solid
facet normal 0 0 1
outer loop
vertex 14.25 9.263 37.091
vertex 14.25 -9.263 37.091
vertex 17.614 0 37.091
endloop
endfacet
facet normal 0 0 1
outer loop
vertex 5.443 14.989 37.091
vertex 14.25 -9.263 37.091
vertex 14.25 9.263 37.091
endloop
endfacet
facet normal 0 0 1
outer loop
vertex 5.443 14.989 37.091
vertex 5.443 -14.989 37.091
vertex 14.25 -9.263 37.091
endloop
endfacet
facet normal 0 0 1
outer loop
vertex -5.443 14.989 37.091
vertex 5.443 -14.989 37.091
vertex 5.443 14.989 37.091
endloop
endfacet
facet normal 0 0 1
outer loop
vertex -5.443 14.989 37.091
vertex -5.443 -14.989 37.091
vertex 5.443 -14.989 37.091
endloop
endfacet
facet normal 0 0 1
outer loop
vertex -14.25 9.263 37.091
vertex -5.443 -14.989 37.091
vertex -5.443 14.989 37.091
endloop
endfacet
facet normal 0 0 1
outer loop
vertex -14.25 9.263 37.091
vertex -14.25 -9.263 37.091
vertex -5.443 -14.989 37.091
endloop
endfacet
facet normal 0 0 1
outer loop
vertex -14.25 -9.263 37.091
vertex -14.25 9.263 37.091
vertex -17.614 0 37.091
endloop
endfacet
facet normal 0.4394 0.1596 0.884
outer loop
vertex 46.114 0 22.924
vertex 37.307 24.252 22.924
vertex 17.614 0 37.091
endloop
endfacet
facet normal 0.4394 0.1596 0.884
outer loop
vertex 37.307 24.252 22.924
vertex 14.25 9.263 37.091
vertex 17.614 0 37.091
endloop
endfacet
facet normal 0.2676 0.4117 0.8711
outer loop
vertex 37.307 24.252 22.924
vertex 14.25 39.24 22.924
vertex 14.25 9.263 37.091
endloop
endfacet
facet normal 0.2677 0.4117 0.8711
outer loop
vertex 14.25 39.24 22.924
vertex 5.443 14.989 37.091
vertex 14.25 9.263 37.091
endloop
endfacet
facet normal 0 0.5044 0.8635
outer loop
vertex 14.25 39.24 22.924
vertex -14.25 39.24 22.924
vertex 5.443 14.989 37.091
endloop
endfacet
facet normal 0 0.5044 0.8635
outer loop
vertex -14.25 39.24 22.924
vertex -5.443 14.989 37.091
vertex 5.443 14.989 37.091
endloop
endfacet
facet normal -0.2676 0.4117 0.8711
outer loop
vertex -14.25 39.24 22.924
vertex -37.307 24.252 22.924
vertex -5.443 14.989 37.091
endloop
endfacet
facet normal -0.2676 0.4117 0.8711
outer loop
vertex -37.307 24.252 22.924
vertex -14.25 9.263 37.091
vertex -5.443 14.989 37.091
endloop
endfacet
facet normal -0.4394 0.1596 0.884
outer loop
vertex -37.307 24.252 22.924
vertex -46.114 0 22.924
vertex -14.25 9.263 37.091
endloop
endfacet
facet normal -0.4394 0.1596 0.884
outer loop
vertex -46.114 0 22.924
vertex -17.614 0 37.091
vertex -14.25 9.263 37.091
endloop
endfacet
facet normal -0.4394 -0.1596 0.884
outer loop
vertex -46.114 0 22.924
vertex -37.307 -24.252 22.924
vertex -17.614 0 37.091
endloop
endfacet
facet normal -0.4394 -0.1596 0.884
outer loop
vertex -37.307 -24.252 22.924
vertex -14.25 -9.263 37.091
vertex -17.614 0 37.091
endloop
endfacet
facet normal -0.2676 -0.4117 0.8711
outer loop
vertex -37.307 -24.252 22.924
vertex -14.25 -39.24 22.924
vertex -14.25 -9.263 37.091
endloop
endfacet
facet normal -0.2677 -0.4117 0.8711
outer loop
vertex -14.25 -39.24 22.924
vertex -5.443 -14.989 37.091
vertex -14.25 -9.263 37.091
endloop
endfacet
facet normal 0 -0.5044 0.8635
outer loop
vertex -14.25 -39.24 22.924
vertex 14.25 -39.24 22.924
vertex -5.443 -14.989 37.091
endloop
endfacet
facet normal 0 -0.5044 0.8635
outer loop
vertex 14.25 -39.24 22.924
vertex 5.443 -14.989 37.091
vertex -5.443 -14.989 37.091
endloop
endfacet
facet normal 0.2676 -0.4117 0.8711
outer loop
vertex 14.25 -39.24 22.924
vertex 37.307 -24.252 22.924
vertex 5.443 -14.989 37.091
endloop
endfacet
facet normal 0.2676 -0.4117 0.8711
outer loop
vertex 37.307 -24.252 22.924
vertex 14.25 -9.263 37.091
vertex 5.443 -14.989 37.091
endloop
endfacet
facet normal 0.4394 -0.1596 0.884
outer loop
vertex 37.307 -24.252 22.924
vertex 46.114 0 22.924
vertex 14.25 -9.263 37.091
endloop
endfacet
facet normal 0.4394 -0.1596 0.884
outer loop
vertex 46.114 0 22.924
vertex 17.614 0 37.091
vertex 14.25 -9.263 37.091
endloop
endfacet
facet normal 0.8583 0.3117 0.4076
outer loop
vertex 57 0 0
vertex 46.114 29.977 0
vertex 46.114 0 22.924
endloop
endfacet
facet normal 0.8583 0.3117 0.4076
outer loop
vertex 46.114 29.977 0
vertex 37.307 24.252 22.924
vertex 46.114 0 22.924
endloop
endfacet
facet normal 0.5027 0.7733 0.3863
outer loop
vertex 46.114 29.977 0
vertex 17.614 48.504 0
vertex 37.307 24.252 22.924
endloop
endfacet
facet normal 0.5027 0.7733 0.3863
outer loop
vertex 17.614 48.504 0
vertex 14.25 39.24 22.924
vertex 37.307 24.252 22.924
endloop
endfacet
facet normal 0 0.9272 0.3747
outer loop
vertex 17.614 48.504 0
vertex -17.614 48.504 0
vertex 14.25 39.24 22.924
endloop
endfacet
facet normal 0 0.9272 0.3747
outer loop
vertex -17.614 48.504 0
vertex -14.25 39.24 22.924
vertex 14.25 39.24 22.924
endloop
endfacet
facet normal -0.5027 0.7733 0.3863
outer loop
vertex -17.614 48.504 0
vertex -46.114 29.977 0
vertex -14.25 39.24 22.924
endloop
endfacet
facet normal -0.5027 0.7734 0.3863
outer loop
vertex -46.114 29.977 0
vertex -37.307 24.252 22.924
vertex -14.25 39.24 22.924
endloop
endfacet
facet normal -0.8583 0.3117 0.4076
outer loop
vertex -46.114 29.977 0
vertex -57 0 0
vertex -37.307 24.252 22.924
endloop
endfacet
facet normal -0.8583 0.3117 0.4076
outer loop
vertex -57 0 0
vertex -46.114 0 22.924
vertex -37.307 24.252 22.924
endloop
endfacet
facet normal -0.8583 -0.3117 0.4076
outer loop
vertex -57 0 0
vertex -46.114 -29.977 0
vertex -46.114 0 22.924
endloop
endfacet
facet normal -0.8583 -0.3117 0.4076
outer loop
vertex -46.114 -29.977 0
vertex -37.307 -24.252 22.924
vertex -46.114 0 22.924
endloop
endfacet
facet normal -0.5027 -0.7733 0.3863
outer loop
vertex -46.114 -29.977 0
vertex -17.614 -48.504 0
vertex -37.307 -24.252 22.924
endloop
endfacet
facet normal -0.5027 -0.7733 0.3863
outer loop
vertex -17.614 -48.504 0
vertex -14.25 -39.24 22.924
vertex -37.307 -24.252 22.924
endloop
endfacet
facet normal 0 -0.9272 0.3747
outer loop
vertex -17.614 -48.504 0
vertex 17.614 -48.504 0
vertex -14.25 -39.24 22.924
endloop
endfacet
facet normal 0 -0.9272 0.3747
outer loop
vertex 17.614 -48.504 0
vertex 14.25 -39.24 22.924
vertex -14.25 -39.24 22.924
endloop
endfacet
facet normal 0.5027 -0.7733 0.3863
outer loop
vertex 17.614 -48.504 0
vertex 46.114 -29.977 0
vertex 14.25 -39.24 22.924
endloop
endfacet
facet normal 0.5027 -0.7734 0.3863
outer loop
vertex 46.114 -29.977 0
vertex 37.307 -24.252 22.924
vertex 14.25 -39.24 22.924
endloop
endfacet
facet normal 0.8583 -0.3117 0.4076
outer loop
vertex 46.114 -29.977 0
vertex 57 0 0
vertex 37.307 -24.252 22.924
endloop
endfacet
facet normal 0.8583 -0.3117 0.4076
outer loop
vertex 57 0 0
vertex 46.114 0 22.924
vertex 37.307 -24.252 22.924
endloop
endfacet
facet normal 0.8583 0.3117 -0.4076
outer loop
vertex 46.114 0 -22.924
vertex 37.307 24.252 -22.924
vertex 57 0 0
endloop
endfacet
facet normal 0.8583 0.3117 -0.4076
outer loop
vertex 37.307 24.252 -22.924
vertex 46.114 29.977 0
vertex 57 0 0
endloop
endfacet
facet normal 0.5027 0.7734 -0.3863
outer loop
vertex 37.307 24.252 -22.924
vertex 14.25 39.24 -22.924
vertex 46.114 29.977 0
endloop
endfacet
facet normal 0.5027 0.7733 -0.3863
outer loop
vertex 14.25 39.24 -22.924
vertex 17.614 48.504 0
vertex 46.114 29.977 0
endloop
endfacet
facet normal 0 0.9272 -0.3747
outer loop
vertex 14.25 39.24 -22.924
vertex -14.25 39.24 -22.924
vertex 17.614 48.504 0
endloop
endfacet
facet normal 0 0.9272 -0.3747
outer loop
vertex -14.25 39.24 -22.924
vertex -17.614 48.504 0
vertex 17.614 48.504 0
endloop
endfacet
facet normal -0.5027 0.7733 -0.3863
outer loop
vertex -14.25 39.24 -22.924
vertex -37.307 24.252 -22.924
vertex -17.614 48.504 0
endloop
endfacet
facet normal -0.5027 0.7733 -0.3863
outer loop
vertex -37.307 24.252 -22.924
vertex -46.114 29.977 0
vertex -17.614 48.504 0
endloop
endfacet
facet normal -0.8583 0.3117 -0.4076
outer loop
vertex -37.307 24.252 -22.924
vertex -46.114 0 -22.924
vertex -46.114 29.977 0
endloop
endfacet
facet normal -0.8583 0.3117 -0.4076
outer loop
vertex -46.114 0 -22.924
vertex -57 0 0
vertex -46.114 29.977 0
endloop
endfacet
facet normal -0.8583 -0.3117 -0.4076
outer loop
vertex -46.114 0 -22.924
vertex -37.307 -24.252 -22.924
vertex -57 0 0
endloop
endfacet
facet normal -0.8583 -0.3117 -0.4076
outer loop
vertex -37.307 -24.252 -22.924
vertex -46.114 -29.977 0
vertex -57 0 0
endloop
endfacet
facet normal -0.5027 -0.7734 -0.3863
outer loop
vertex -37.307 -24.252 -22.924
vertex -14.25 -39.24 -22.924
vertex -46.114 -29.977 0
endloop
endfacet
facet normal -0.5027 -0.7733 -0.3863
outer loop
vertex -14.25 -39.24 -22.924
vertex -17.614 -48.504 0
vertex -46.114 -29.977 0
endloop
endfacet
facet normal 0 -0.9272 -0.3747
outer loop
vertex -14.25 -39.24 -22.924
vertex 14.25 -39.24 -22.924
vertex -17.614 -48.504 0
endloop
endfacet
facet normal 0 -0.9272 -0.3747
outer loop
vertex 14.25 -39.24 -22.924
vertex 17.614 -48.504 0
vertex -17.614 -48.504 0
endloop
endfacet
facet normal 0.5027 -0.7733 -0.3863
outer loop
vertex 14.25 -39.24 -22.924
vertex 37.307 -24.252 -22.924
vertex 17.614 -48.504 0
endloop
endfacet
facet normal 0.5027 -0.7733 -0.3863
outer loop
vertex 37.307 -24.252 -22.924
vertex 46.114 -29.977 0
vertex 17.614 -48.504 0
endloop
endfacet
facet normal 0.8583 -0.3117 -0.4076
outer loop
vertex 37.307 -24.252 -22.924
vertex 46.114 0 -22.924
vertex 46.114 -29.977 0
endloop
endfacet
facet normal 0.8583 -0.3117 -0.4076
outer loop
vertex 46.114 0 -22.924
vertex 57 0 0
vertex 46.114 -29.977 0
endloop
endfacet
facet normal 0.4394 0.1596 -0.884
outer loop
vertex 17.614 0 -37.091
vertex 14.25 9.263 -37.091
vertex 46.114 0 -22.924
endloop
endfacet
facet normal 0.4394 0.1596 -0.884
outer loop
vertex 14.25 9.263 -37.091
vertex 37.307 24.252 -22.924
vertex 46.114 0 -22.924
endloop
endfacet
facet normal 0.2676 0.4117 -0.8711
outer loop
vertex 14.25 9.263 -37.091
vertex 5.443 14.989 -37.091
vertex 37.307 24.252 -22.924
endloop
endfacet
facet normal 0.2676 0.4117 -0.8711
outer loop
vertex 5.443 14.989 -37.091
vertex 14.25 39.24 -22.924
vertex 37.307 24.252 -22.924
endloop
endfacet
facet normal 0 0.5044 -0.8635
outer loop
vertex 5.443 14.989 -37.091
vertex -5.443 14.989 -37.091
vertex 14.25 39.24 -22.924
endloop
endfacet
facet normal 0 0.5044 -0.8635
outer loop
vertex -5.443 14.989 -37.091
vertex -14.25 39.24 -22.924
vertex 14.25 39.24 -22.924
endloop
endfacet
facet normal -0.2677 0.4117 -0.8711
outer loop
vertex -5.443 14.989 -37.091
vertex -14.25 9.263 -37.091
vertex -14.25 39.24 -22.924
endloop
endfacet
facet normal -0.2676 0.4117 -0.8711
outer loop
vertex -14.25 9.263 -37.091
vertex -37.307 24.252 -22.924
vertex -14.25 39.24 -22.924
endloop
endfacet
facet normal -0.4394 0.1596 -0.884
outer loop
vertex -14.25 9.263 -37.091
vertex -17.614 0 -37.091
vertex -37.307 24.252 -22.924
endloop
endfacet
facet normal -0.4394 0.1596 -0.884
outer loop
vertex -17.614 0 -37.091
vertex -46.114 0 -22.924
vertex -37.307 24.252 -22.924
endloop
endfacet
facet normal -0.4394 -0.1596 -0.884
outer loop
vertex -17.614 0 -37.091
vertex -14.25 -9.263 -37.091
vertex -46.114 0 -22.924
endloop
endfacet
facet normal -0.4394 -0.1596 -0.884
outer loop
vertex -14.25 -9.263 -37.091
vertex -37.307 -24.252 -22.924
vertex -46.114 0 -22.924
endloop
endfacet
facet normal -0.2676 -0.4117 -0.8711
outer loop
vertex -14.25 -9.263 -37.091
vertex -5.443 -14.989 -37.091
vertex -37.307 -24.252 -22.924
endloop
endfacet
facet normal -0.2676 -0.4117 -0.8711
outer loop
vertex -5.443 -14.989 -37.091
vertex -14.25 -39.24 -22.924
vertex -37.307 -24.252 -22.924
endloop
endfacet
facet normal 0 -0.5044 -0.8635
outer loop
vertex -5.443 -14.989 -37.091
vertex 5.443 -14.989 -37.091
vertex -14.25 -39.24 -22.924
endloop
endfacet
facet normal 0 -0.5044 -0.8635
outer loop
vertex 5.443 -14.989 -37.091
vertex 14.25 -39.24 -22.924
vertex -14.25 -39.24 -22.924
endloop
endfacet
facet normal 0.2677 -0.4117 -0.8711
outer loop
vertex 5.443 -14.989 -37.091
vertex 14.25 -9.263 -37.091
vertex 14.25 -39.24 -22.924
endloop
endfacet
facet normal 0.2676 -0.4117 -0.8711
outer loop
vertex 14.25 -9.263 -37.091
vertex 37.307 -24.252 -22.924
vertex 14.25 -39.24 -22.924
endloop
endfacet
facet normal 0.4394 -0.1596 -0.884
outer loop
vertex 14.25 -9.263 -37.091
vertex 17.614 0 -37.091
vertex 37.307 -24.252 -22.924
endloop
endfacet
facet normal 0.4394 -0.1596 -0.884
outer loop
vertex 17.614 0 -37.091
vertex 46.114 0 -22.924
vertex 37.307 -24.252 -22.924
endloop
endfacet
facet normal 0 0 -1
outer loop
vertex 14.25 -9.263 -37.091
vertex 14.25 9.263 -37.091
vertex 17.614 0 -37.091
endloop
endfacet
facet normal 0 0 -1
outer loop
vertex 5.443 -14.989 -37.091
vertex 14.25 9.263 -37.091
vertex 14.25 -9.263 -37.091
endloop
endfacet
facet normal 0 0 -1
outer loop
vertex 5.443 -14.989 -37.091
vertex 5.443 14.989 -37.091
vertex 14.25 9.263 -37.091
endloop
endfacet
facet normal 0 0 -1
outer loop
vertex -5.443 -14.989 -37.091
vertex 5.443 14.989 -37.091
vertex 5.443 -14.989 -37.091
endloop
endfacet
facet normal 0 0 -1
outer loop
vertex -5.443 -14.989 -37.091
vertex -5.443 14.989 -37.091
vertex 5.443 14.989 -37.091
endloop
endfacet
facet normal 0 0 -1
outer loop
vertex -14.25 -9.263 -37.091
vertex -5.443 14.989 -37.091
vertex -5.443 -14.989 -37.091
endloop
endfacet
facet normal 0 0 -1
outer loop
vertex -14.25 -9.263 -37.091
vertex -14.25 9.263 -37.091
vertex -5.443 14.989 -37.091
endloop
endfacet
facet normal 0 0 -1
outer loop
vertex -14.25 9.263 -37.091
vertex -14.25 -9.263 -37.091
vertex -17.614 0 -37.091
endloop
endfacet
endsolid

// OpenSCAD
// Generated by SolidPython 1.0.1 on 2020-07-29 00:46:54


scale(v = [19, 17, 13]) {
	sphere(r = 3);
}
/***********************************************
*********      SolidPython code:      **********
************************************************
 
# import packages: SolidPython
from solid import *
from solid.utils import *
from itertools import chain, combinations, permutations


class Resize:

    def __init__(self, scad_file):
        self.scad_file = scad_file
        #self.scad_file = import_scad(scad_file)
        # cone/cylinder param:
        self.r1 = 0
        self.r2 = 0
        self.h = 0
        # rectangular prism param:
        self.w = 0
        self.l = 0
        # ellipse param:
        self.r = 0

    # import OpenScad code (file name corresponds to shape)


    # classify shape + parameters
    def assign(self, param1, param2, param3):
        if self.scad_file == 'cone.scad':
            self.r1 = param1
            self.r2 = param2
            self.h = param3
        elif self.scad_file == 'cylinder.scad':
            self.r1 = param1
            self.r2 = param2
            self.h = param3
        elif self.scad_file == 'rectangularPrism.scad':
            self.h = param1
            self.l = param2
            self.w = param3
        else:
            self.r = param1
            self.h = param2

    # resize parameters
    def iterate(self):
        x = range(3, 20, 2)
        i = 1
        if self.scad_file == 'cone.scad':
            tempList = list(permutations(x, 2))
            for temp in tempList:
                param1 = temp[0]
                param2 = temp[1]
                filepath = 'produced_scad_files/' + 'cone' + str(param1) + '_' + str(param2) + '_' + '.scad'
                scad_render_to_file(cylinder(h=param1, r1=param2, r2=0), filepath)

        elif self.scad_file == 'cylinder.scad':
            tempList = list(permutations(x, 3))
            for temp in tempList:
                param1 = temp[0]
                param2 = temp[1]
                filepath = 'produced_scad_files/' + 'cylinder' + str(param1) + '_' + str(param2) + '_' + '.scad'
                scad_render_to_file(cylinder(h=param1, r1=param2, r2=param2), filepath)

        elif self.scad_file == 'rectangularPrism.scad':
            tempList = list(permutations(x, 3))
            for temp in tempList:
                param1 = temp[0]
                param2 = temp[1]
                param3 = temp[2]
                filepath = 'produced_scad_files/' + 'rectangularPrism' + str(param1) + '_' + str(param2) + '_' + str(
                    param3) + '.scad'
                scad_render_to_file(cube(size=(param1, param2, param3)), filepath)

        elif self.scad_file == 'ellipse.scad':
            tempList = list(permutations(x, 4))
            for temp in tempList:
                param1 = temp[0]
                param2 = temp[1]
                param3 = temp[2]
                param4 = temp[3]
                filepath = 'produced_scad_files/' + 'ellipse' + str(param1) + '_' + str(param2) + '_' + str(param3) + '_' + str(param4) + '.scad'
                scad_render_to_file(scale([param1, param2, param3])(sphere(r=param4)), filepath)

    def render_to_scadfile(self):
        scad_render_to_file(scad, 'example.scad') 
 
************************************************/
